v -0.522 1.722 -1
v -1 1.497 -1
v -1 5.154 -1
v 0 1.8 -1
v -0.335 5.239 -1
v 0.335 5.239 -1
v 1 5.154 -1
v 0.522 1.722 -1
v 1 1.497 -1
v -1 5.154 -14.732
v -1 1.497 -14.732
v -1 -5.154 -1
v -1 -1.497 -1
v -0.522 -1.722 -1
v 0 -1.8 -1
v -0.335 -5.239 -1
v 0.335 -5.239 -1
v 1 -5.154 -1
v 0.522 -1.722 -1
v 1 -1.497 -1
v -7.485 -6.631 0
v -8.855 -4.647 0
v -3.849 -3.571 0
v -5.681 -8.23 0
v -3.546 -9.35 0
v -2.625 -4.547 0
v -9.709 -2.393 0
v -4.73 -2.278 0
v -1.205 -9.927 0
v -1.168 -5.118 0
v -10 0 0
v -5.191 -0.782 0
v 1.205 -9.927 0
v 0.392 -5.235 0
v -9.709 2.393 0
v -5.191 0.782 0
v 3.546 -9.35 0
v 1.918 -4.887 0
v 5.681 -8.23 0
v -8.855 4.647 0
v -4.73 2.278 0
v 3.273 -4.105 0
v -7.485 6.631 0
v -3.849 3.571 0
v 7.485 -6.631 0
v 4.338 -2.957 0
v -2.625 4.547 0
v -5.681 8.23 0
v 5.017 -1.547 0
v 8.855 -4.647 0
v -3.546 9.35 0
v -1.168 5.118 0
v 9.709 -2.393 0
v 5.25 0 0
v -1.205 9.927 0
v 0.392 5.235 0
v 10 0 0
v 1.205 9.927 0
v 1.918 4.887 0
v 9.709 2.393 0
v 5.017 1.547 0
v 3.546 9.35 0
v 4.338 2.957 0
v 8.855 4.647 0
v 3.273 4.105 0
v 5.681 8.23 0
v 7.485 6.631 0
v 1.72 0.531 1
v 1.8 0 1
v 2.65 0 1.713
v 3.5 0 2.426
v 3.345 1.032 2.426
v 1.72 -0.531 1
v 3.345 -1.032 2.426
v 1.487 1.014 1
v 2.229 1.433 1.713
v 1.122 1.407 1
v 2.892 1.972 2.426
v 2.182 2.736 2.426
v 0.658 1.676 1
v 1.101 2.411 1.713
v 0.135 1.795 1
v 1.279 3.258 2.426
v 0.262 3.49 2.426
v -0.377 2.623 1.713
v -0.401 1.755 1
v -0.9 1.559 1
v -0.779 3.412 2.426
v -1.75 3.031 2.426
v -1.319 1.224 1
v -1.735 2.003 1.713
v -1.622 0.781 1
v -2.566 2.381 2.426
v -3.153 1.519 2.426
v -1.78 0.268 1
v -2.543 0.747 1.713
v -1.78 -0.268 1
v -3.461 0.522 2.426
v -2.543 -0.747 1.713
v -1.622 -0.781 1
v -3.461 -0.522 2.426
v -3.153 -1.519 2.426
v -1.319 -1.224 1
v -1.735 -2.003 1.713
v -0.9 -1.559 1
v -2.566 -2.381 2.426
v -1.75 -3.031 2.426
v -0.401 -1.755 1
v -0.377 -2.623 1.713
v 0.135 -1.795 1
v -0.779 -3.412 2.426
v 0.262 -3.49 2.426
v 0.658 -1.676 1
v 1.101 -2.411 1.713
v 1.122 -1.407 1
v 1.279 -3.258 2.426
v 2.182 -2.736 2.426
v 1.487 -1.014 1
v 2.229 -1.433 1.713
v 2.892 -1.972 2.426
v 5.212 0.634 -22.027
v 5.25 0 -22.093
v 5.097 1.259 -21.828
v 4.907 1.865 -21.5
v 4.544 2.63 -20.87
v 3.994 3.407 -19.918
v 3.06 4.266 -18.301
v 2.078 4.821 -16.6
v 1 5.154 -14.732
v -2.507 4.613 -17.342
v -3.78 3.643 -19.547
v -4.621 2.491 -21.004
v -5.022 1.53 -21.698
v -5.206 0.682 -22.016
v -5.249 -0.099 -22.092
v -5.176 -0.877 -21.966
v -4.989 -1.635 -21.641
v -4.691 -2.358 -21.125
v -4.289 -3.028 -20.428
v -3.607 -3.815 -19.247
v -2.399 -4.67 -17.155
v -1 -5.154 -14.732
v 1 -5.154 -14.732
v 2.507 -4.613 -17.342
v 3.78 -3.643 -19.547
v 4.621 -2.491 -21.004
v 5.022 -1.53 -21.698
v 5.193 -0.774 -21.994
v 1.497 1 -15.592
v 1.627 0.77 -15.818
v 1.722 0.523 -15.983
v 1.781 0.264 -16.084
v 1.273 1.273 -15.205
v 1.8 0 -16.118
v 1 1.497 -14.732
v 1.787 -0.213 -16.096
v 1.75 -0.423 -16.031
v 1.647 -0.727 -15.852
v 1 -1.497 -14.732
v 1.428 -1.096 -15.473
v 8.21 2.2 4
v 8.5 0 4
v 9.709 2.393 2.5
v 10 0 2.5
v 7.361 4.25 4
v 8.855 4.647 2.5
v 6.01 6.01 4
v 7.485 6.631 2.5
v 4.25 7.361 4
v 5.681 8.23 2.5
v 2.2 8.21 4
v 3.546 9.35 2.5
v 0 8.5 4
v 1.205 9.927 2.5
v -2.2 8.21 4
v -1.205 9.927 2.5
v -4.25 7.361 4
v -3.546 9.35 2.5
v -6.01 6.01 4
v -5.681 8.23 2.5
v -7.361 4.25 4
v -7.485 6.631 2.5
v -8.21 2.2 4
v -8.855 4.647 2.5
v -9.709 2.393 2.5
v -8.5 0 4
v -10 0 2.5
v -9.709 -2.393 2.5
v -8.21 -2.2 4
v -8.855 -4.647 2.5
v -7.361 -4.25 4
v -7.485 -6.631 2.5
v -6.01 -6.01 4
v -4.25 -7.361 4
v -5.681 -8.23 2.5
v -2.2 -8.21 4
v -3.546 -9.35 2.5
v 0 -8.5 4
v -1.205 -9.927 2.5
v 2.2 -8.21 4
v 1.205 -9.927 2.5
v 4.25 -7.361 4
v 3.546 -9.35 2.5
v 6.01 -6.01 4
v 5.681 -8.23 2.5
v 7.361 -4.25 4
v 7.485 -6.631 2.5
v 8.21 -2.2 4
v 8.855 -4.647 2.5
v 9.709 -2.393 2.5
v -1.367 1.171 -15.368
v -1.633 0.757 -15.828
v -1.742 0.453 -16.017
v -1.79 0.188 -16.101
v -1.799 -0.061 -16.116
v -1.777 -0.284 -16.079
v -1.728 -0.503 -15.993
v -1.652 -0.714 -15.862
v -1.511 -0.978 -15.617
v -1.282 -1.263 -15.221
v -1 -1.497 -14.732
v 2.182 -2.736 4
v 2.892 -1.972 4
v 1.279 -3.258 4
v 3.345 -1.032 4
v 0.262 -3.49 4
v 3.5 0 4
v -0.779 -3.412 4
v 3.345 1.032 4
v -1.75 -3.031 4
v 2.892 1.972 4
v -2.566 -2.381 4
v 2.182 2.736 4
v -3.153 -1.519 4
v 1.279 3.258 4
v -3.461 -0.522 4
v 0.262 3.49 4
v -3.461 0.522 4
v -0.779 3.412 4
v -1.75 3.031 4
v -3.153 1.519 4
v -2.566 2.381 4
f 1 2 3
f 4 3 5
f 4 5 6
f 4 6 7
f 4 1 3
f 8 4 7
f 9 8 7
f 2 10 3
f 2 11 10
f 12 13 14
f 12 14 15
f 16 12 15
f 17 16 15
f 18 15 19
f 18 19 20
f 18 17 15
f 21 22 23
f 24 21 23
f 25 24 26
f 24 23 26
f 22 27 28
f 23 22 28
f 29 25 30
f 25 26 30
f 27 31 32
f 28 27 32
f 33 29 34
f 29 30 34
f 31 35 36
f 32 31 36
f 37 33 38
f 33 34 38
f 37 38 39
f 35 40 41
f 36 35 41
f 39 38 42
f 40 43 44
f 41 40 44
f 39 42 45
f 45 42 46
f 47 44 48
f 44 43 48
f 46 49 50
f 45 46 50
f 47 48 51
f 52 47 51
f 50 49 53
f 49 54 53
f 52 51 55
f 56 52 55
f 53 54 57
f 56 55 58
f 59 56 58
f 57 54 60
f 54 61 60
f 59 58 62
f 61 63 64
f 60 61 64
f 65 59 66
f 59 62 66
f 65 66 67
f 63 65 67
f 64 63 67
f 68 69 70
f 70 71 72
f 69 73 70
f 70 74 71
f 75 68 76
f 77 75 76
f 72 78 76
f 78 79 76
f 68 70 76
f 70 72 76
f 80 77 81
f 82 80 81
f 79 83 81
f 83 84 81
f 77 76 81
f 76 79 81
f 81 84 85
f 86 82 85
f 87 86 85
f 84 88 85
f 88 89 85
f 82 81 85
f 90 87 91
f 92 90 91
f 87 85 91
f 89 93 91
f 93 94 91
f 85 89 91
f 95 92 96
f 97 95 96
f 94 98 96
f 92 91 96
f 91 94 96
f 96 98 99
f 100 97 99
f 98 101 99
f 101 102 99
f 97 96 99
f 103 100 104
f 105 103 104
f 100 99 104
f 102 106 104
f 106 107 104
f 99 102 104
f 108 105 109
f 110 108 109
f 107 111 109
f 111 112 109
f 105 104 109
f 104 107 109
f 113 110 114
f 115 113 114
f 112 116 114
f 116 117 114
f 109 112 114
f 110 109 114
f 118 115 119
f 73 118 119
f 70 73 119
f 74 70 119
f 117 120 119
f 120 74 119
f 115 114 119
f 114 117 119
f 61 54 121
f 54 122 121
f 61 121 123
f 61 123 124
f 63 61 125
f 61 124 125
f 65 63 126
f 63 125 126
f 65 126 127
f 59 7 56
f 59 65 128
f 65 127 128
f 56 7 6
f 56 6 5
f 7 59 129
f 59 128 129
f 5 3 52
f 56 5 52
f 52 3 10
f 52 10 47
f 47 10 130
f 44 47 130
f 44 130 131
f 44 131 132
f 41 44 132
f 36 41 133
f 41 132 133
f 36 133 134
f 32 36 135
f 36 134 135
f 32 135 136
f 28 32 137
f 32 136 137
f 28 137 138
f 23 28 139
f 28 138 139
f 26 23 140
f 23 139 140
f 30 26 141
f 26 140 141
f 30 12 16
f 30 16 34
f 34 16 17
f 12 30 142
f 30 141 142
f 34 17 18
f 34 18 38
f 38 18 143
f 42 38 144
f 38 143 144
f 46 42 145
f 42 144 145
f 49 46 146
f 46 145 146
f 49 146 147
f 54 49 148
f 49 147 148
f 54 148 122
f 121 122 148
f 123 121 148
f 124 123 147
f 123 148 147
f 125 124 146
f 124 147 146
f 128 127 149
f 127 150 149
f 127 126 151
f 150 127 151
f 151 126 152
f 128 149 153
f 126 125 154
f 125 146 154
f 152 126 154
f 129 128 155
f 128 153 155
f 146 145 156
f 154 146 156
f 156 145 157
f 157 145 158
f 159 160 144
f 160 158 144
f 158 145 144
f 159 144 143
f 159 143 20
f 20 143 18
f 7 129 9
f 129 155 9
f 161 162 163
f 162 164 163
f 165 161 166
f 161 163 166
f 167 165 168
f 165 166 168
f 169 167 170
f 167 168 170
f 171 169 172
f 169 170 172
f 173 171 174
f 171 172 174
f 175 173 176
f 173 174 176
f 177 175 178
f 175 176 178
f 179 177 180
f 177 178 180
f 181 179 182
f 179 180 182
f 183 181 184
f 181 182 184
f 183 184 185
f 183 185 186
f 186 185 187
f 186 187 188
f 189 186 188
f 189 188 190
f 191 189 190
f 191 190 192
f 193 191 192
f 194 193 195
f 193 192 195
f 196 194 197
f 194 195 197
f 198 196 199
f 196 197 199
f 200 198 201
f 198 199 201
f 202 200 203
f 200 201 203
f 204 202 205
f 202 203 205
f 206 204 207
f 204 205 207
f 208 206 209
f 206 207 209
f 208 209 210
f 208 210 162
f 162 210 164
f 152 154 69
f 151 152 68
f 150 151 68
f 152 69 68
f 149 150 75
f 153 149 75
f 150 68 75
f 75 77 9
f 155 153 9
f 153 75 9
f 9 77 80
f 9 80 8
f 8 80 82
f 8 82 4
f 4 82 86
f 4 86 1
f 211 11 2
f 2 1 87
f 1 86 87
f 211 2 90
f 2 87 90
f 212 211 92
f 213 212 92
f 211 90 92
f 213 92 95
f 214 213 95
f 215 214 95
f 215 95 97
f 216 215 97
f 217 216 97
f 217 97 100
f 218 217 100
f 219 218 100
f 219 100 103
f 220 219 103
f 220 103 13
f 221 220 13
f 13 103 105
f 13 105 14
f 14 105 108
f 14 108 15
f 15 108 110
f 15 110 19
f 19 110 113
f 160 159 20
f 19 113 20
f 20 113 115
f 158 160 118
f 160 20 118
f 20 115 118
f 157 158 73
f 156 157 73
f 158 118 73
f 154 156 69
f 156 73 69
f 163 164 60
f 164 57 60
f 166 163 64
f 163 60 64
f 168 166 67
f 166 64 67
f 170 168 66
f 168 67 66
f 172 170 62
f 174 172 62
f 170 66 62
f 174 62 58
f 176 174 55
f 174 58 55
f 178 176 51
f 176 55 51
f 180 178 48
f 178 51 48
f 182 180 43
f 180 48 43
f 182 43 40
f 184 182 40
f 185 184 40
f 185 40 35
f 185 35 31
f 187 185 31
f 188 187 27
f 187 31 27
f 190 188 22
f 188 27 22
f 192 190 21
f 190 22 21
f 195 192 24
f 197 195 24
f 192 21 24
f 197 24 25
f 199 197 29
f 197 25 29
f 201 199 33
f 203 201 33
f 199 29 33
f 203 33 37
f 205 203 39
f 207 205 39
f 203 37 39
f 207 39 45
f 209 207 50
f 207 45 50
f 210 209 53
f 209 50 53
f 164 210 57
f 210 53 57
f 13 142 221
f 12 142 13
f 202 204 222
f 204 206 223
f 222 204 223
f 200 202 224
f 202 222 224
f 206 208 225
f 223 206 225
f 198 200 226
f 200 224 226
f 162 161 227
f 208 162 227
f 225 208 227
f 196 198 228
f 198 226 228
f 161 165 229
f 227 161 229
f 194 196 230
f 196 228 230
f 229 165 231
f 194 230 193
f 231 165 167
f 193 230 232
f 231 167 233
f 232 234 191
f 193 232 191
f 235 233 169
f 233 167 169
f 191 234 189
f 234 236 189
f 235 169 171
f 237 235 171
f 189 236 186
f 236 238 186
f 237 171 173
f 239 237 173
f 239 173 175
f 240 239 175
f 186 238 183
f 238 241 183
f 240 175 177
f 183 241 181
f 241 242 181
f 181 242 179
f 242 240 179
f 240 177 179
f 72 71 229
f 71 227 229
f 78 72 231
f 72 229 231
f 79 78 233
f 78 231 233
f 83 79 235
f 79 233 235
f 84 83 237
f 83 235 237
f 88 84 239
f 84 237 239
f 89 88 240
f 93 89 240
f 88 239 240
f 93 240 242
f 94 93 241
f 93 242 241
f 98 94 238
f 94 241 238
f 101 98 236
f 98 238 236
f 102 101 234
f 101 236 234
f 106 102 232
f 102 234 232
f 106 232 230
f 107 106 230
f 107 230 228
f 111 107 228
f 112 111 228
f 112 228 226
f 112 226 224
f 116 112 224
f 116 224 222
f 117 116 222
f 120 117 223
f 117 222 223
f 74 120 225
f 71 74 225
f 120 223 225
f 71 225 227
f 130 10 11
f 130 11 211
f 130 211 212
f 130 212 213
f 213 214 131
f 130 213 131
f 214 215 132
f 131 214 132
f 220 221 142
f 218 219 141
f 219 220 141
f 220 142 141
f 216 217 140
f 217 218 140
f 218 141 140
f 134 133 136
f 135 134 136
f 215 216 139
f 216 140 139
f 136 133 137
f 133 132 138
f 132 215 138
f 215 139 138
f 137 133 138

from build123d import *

# Parameters (mm, degrees)
SKETCH002_W  = 2
SKETCH002_H  = 25
PAD001_DEPTH = 15
PAD_DEPTH    = 7.5


with BuildPart() as pad001:
    # Sketch002 → Pad001 (new body, symmetric)
    with BuildSketch(Plane.XZ):
        with Locations((0, -13.5)):
            Rectangle(SKETCH002_W, SKETCH002_H)
    extrude(amount=PAD001_DEPTH, both=True)


with BuildPart() as pad:
    # Sketch001 → Pad (new body, symmetric)
    with BuildSketch(Plane.XZ):
        Polygon((8, -26.856406), (0, -13), (-8, -26.856406), align=None)
    extrude(amount=PAD_DEPTH, both=True)


with BuildPart() as cut001:
    # Sketch → Revolution (revolve)
    with BuildSketch(Plane.XZ):
        Polygon((3.5, 4), (8.5, 4), (10, 2.5), (10, 0), (5.25, 0), (5.25, -23), (1.8, -23), (1.8, 1), (3.5, 2.426469), align=None)
    revolve(axis=Axis((0, 0, 0), (0, 0, 1)))

    # Cut: cut Pad
    add(pad.part, mode=Mode.SUBTRACT)

    # Cut001: cut Pad001
    add(pad001.part, mode=Mode.SUBTRACT)


solid = cut001.part
